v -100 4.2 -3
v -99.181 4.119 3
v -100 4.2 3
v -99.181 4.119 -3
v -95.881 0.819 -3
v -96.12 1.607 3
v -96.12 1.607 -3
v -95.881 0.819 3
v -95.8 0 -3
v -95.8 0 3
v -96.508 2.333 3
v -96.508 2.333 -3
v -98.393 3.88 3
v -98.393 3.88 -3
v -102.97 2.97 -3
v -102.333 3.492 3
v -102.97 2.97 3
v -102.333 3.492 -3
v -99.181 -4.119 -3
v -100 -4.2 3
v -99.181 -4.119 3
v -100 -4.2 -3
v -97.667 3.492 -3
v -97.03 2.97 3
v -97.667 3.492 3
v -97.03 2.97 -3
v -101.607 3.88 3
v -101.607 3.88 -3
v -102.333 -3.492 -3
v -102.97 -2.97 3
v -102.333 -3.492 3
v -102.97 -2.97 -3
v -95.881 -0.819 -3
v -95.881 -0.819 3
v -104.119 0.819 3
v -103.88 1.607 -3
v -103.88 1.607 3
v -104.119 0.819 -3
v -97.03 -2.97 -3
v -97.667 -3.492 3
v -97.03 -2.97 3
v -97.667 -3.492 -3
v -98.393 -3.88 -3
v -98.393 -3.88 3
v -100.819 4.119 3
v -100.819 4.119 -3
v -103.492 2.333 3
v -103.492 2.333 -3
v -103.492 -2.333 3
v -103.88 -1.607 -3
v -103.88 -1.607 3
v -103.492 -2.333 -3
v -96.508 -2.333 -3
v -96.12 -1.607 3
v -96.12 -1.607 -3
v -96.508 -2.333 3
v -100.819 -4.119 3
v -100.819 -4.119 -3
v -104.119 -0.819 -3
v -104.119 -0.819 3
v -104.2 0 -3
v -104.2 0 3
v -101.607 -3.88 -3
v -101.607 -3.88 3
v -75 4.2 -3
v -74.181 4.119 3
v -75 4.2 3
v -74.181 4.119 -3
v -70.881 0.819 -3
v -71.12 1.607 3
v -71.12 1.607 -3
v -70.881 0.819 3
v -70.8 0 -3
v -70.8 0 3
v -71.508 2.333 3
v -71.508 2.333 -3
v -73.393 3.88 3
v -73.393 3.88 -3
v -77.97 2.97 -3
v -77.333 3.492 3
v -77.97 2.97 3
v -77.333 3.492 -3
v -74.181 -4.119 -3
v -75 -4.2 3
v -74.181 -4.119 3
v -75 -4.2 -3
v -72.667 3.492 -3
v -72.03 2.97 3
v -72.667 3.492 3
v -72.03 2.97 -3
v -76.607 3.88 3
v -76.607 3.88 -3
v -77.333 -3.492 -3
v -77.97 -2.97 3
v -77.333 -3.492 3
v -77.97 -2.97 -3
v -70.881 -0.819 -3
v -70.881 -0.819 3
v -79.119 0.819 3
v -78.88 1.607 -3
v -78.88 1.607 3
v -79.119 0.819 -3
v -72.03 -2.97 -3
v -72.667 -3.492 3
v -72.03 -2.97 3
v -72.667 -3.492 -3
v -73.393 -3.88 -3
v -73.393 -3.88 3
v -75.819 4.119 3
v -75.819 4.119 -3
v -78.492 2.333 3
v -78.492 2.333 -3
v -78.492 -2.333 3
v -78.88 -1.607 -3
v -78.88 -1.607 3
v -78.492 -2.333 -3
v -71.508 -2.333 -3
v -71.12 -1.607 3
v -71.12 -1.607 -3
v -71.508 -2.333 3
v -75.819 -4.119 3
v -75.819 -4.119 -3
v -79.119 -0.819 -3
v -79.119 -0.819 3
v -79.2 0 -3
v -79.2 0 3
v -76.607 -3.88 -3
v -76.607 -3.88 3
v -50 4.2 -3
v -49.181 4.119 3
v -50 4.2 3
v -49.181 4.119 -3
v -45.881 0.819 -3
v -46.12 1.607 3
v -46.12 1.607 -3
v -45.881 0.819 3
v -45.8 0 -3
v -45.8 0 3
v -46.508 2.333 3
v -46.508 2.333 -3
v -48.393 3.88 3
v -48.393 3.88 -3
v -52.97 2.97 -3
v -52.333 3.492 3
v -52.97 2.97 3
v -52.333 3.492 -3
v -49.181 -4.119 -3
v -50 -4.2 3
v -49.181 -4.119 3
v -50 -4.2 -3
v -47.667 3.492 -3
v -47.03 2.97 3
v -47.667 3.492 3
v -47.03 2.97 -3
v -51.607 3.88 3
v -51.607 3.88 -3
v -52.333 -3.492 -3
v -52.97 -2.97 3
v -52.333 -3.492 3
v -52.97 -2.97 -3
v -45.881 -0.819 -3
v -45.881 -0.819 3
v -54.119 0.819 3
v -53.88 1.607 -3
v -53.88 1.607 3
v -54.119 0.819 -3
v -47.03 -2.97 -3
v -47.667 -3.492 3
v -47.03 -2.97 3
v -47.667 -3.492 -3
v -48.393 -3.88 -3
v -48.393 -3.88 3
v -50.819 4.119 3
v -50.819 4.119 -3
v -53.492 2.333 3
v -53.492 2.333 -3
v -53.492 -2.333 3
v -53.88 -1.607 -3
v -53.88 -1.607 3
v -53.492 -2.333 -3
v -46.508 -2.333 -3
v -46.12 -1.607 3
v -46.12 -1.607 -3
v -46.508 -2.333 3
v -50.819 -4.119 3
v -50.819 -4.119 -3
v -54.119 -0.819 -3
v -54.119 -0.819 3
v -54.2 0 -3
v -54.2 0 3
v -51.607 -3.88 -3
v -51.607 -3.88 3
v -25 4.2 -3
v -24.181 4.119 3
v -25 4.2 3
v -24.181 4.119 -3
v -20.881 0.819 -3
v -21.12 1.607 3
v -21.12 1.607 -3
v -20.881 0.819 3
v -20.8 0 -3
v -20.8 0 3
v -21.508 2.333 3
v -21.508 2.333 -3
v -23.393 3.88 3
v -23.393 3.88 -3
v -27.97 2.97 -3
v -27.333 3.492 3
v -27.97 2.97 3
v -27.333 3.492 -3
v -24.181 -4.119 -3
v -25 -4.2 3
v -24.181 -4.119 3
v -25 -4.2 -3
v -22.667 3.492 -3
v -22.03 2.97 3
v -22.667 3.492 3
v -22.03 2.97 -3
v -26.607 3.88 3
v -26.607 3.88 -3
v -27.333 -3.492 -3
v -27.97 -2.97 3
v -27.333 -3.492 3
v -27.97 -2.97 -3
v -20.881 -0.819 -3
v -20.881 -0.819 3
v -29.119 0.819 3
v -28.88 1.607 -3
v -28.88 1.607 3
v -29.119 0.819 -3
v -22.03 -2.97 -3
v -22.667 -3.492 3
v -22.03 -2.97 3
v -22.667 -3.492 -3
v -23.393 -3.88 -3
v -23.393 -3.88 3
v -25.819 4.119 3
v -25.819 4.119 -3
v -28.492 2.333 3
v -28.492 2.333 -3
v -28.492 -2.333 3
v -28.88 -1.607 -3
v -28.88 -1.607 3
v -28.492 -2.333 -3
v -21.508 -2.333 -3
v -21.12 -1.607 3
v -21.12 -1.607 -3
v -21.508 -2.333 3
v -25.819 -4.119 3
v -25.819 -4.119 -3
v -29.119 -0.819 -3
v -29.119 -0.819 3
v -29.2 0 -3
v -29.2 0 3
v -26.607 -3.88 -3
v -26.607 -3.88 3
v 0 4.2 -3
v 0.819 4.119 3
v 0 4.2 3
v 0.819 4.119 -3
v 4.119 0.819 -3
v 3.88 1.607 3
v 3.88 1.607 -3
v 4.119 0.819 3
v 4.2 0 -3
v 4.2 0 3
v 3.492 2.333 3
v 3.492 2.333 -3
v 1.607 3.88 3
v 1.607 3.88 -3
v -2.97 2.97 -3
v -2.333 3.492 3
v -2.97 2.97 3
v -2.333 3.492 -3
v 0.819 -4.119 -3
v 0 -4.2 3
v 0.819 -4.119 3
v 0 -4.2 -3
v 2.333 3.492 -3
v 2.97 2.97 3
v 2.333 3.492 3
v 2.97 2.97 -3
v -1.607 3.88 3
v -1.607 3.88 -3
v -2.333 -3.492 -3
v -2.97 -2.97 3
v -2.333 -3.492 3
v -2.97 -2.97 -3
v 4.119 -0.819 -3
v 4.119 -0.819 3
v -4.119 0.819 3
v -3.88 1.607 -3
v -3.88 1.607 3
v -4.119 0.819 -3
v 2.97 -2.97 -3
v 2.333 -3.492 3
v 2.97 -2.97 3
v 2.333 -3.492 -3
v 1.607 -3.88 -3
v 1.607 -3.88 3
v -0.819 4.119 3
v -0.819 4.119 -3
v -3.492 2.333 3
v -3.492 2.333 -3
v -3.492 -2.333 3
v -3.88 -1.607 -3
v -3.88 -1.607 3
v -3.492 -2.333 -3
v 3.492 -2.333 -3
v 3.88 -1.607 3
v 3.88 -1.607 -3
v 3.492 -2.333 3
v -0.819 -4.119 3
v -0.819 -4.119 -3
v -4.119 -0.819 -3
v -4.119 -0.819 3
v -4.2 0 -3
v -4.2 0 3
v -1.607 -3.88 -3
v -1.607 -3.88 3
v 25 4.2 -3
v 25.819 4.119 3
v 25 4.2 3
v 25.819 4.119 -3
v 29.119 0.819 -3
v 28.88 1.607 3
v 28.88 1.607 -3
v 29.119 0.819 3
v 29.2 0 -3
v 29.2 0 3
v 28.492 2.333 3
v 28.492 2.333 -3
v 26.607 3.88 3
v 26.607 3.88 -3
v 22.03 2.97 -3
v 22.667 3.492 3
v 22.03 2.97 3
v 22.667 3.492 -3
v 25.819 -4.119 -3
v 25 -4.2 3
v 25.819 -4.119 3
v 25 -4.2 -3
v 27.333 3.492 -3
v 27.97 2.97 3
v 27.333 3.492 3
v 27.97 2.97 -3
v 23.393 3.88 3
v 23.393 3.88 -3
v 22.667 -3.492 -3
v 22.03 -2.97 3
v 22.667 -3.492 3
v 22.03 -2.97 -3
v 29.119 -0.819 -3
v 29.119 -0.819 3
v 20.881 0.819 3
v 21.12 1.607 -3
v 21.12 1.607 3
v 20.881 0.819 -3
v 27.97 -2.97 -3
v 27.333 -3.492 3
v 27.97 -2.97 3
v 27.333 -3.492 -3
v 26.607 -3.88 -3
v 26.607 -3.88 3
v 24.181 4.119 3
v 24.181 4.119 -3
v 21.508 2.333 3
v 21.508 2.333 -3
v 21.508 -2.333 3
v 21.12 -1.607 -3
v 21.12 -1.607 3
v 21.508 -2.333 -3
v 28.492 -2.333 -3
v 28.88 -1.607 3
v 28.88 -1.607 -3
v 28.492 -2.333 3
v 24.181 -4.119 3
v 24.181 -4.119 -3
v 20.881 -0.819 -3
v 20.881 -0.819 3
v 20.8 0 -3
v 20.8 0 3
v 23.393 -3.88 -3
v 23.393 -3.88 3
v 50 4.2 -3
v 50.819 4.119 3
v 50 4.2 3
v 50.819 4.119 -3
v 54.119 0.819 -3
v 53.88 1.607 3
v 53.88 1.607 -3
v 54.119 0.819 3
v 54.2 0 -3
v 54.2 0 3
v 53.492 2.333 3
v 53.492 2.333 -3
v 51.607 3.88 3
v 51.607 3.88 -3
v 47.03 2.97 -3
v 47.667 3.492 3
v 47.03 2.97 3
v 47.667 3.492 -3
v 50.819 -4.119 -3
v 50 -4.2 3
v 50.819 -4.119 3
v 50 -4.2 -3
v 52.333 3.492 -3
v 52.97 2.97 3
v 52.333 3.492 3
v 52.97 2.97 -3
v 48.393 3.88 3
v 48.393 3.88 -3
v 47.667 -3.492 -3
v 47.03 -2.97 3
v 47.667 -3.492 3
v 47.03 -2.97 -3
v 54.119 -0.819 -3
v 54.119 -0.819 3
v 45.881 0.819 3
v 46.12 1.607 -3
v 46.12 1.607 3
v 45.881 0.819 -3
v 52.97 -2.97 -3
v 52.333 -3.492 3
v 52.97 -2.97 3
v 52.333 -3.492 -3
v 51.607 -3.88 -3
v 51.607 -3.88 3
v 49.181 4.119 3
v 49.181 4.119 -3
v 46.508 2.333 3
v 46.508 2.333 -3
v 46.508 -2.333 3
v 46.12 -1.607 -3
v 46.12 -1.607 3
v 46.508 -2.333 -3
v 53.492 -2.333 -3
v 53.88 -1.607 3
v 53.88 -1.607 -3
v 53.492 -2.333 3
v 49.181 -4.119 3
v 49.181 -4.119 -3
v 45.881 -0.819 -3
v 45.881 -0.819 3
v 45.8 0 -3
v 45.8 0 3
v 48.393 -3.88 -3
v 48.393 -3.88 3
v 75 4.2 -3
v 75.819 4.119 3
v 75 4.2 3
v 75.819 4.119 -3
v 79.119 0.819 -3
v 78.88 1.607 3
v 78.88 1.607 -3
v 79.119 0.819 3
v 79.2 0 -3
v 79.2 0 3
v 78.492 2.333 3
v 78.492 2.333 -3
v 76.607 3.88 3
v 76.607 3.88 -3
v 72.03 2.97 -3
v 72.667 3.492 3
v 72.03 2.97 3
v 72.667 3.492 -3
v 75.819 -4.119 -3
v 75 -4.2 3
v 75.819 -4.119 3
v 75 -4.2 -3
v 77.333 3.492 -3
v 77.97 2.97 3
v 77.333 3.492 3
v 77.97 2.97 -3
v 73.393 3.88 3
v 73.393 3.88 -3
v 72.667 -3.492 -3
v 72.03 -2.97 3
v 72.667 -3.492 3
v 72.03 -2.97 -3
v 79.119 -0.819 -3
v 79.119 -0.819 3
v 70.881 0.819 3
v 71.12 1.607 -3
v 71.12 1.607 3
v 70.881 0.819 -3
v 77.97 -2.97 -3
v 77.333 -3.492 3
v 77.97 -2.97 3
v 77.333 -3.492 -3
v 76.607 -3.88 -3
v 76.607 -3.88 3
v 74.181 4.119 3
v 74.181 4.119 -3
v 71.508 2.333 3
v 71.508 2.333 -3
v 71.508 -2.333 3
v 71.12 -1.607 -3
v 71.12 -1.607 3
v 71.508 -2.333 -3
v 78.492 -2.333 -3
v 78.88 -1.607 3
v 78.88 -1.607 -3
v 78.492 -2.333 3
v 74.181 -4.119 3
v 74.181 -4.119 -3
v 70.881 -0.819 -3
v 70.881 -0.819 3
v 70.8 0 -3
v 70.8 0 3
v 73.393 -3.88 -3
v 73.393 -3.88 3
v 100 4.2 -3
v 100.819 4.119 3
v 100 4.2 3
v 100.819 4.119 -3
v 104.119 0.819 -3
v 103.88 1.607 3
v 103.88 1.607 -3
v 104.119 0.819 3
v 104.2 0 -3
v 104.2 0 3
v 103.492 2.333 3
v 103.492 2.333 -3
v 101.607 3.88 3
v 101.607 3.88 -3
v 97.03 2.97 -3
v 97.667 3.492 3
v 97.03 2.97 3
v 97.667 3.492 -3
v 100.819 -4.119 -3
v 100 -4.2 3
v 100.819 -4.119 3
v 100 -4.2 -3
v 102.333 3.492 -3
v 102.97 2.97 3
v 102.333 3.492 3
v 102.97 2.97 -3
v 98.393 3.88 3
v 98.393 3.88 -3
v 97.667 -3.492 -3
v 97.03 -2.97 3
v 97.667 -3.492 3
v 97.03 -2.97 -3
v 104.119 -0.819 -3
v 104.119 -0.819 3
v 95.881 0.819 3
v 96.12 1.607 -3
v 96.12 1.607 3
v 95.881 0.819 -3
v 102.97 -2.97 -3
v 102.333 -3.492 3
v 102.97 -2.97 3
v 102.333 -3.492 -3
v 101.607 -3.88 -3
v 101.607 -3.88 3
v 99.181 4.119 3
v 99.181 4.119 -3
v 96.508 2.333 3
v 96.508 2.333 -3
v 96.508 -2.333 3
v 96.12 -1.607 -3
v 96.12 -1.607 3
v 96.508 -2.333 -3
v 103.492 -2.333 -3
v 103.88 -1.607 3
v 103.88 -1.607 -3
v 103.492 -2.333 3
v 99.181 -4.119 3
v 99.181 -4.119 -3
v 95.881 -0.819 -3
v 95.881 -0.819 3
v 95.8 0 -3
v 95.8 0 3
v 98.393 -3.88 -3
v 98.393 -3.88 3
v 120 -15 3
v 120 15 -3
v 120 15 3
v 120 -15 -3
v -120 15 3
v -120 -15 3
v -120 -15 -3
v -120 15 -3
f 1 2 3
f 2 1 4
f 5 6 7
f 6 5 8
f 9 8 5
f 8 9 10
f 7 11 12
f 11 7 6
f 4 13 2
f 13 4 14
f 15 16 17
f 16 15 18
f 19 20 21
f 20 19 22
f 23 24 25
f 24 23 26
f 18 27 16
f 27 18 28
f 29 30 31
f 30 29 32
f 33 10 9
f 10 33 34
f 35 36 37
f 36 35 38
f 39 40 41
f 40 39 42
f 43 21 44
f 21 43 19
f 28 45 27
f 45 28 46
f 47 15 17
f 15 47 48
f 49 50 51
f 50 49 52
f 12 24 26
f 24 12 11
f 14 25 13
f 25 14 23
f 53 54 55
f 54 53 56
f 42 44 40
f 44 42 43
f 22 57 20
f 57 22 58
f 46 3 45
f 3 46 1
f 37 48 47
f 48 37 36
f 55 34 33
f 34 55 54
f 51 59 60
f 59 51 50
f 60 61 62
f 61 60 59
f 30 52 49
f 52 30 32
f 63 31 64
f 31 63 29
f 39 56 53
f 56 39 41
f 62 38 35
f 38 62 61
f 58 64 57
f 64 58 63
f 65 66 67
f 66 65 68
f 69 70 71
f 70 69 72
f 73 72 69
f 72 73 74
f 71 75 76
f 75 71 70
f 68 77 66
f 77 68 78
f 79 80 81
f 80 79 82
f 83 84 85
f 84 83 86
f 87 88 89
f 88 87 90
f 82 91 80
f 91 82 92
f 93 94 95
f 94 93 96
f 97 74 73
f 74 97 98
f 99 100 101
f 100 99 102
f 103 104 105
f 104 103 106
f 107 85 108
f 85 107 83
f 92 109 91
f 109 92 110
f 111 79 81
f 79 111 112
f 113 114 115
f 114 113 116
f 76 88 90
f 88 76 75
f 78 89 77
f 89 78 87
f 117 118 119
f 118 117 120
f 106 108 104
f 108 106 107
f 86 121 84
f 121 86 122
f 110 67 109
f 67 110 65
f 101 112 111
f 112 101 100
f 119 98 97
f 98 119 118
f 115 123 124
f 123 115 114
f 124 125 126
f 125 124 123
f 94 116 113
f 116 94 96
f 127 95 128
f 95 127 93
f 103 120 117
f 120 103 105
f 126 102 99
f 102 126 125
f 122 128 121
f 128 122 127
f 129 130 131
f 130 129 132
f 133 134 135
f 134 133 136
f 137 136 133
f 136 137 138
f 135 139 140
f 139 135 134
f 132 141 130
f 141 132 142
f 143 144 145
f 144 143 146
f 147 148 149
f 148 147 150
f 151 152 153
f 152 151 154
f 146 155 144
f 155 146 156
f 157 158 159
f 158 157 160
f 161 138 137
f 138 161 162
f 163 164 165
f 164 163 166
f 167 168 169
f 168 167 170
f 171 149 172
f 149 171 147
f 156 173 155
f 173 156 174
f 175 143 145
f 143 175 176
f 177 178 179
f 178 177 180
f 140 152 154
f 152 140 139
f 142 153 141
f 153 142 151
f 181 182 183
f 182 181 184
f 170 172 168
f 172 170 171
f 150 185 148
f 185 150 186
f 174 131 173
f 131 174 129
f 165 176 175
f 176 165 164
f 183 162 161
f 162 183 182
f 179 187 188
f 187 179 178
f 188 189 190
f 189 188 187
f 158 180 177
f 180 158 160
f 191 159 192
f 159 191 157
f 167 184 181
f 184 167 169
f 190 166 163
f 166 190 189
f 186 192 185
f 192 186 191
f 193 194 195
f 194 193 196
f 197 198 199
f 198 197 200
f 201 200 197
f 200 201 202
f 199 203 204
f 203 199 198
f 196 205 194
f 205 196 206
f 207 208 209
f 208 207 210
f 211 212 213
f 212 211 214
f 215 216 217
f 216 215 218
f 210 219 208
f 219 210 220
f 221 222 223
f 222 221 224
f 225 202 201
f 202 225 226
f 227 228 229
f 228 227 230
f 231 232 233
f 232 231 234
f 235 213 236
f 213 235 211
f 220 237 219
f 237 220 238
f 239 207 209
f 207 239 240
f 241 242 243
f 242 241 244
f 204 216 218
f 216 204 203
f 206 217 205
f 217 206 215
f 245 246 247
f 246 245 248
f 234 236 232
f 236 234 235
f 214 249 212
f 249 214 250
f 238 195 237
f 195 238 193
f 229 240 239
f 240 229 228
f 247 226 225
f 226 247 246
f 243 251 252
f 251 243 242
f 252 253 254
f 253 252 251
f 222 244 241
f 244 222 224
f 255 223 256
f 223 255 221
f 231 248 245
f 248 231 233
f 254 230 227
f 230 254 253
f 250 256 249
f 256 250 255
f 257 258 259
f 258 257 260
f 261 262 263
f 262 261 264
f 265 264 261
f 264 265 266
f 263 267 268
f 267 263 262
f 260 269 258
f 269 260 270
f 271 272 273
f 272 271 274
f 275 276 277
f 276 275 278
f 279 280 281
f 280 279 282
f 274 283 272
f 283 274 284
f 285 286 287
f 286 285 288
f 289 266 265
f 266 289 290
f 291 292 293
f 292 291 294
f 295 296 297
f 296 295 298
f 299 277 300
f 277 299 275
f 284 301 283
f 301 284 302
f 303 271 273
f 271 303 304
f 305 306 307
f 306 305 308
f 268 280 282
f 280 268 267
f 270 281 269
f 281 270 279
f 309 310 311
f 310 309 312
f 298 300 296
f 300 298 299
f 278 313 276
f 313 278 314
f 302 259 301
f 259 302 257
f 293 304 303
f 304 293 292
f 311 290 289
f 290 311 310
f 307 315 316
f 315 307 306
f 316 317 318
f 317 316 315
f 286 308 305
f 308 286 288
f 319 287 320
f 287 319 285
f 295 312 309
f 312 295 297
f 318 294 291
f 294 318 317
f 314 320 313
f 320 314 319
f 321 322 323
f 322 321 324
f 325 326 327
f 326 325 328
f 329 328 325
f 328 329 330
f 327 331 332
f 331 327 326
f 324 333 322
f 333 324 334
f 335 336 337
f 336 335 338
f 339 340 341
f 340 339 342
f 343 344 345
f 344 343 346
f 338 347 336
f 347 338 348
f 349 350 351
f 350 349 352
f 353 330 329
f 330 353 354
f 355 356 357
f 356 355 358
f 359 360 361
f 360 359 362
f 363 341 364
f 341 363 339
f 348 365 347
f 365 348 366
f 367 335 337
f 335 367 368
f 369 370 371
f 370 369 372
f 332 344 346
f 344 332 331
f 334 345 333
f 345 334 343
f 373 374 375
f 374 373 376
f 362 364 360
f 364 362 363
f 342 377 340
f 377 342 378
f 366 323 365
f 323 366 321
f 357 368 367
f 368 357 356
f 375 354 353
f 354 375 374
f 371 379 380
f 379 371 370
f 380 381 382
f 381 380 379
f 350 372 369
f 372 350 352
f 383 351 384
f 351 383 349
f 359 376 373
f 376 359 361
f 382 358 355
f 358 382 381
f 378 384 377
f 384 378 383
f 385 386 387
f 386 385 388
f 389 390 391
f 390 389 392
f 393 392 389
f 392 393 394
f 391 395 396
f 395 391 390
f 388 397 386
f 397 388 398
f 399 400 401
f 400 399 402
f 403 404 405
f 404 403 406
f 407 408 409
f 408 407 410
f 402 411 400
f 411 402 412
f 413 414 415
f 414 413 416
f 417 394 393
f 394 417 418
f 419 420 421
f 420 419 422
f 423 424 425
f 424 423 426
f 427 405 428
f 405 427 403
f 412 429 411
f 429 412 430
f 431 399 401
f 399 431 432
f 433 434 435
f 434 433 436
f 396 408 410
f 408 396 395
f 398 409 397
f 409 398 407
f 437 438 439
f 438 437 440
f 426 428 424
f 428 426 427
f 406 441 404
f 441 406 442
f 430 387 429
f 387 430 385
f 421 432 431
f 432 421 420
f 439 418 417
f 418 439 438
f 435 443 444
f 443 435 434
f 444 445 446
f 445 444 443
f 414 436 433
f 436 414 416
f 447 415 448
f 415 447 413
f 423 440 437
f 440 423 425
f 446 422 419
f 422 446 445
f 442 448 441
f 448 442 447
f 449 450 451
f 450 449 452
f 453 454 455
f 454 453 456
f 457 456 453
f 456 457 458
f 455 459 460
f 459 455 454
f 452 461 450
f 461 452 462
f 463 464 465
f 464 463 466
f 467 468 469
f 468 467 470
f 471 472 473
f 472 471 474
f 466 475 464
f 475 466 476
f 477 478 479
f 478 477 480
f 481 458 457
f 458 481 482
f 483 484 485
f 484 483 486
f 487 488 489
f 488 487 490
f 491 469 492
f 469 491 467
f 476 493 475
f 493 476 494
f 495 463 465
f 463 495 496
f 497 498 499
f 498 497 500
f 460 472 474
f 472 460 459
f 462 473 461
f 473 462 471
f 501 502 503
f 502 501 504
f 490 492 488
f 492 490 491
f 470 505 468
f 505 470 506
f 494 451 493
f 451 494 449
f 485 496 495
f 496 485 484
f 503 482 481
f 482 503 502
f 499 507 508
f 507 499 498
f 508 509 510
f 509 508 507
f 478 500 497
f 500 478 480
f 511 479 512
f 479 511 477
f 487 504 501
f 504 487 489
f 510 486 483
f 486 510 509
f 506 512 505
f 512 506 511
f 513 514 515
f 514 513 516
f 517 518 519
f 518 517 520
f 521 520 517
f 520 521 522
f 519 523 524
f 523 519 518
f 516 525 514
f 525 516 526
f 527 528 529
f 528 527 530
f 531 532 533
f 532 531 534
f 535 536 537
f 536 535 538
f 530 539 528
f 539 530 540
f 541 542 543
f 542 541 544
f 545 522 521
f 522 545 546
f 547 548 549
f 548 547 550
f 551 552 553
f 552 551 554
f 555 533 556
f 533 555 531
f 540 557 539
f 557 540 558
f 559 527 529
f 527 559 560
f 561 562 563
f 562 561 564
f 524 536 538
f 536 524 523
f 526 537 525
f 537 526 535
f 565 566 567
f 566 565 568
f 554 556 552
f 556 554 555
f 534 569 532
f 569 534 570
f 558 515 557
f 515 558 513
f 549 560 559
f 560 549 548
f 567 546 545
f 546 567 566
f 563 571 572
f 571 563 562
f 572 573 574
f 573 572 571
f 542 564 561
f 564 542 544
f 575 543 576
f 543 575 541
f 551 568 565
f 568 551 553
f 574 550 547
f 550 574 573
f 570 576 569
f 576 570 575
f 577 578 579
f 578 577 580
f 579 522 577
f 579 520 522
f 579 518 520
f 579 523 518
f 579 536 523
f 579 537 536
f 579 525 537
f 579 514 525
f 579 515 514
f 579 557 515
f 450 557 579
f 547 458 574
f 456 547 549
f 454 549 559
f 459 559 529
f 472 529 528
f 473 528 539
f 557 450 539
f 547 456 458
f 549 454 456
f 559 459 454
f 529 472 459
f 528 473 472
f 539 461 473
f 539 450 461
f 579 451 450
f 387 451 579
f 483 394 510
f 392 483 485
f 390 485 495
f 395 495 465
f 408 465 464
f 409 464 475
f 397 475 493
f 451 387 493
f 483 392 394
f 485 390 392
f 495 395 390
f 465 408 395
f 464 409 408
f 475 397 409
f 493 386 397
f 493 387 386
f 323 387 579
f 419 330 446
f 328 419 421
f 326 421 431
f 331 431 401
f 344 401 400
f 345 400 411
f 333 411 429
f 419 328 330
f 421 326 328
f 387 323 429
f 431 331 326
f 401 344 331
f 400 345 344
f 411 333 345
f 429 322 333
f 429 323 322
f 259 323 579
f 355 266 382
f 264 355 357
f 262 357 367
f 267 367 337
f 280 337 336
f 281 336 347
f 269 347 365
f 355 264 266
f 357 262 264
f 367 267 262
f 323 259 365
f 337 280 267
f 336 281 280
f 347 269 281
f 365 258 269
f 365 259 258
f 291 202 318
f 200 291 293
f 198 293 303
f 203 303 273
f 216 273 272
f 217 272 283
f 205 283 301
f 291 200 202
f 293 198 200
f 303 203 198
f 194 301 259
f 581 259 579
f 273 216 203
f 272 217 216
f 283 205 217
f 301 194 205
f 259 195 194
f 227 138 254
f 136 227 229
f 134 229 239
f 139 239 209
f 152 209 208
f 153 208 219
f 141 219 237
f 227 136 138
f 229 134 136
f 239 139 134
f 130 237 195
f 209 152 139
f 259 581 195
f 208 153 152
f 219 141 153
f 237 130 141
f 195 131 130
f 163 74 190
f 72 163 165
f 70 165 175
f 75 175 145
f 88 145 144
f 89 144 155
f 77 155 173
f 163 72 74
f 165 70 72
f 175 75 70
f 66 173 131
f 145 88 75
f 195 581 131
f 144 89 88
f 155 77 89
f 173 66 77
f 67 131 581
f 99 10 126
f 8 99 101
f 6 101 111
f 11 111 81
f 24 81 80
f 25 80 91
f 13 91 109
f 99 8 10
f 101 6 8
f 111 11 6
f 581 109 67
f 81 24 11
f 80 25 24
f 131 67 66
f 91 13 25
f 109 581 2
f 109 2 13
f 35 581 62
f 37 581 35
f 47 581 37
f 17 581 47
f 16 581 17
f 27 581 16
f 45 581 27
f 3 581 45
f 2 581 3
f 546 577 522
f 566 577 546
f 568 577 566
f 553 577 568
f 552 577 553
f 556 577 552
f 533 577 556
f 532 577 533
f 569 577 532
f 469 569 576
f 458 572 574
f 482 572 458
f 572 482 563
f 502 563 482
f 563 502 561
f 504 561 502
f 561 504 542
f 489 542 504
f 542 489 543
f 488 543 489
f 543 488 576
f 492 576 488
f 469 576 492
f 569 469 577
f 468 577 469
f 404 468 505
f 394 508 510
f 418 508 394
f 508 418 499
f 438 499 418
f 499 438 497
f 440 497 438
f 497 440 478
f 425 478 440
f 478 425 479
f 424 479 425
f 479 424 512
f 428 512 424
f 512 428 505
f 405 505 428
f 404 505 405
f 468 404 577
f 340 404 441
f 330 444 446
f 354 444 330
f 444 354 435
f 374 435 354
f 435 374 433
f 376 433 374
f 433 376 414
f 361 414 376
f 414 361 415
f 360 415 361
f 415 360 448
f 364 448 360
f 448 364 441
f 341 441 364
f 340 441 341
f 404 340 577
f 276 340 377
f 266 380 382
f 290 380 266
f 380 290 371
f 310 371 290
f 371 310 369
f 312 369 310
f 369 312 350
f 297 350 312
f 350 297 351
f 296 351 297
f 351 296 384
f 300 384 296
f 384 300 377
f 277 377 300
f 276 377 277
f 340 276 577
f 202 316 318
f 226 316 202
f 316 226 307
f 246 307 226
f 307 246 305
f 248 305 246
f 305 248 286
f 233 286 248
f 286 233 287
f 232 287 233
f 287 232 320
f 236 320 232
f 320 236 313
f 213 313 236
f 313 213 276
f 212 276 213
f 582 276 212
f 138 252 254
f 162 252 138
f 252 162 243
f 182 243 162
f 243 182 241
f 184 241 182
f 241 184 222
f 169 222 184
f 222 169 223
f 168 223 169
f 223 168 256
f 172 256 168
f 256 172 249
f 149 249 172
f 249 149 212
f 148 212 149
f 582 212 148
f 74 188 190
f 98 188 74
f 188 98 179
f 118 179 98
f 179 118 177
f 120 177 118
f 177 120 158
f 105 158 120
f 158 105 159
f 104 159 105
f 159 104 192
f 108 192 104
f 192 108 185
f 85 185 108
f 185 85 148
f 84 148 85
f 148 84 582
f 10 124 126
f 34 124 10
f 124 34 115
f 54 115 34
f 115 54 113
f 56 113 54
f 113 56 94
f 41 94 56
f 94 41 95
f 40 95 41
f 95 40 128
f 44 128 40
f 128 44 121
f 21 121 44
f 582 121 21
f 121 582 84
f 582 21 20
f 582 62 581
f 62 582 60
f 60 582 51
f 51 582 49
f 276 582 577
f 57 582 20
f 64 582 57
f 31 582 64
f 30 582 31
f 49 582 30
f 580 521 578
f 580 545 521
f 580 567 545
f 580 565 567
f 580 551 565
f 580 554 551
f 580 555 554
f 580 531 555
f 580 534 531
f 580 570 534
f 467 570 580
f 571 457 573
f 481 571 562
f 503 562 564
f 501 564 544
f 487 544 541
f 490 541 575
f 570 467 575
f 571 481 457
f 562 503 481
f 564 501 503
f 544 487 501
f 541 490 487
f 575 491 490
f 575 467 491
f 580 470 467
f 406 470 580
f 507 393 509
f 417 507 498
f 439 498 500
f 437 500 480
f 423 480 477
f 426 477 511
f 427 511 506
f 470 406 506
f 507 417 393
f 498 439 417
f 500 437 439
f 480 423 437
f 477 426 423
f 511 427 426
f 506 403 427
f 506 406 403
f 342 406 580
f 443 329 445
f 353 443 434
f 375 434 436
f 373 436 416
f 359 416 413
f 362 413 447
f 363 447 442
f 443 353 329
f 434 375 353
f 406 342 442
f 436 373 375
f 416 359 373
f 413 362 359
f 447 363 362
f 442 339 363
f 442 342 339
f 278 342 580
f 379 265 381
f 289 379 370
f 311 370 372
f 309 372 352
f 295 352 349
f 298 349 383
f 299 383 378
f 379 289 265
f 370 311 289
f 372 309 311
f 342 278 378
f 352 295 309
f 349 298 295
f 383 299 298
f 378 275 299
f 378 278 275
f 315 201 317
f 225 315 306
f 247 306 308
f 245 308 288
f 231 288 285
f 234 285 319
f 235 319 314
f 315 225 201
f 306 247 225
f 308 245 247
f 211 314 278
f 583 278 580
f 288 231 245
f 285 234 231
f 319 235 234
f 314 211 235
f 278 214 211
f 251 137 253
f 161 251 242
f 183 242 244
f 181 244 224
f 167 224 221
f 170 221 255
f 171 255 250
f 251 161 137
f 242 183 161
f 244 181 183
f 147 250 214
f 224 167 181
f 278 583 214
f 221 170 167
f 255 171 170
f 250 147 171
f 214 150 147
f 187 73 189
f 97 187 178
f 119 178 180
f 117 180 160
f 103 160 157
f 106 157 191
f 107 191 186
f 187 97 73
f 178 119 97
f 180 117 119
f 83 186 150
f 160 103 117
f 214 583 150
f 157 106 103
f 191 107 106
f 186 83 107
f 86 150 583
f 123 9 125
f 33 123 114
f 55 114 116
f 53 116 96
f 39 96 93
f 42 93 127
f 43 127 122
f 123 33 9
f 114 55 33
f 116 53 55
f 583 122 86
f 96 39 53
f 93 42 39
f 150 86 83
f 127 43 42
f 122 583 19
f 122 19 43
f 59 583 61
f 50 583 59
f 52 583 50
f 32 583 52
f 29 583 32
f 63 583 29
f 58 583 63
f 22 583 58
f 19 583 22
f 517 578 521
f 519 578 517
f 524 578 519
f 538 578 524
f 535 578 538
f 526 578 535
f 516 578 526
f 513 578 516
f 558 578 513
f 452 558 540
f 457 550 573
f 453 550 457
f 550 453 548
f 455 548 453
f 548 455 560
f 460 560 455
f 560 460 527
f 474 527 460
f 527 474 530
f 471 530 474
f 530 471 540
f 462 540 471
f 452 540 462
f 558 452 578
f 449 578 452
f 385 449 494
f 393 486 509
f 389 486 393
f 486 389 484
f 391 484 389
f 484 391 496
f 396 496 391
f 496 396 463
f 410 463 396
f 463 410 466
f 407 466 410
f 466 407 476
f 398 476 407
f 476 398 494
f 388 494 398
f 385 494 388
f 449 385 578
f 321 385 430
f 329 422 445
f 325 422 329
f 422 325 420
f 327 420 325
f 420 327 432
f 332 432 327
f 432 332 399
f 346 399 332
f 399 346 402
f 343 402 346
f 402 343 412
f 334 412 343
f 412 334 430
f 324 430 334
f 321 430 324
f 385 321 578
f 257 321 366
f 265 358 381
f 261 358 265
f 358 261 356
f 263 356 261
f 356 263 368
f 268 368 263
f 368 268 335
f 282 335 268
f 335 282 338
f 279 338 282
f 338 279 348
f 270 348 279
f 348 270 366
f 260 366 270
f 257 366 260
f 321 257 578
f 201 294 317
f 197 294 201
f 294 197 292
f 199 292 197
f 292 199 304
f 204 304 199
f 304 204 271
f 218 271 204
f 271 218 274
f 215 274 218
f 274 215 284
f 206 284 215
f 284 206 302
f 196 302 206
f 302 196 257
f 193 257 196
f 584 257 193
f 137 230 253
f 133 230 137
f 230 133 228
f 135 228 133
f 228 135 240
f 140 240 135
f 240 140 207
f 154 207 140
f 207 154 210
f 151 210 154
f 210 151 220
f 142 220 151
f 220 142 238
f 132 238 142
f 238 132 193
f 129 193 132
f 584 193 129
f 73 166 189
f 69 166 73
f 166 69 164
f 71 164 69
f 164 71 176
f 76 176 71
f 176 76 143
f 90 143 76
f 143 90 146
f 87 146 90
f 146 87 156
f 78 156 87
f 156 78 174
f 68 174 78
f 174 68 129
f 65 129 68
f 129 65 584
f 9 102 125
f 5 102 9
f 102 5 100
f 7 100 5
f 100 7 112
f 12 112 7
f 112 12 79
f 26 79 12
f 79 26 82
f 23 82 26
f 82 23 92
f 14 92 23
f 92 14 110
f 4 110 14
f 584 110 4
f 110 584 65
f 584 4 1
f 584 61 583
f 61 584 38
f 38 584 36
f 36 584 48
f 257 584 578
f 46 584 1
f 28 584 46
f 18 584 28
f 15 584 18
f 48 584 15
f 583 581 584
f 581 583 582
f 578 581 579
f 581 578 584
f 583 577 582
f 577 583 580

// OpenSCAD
$fn = 32;

// ----------------------------------------------------------------------
// Hole bar, 9 x Ø8.4
// row layout, 20 mm edge offset
// ----------------------------------------------------------------------

// --- parameters (mm) ---
bar_w = 30;    // bar width (Y)
bar_t = 6;     // bar thickness (Z)
holes = 9;     // holes per row
hole_d = 8.4;  // hole diameter
edge = 20;     // offset from the bar end to the first hole
pitch = 25;    // pitch between neighbouring holes

// --- derived feature positions (mm) ---
span = (holes - 1) * pitch;   // = 200   distance between the end holes
bar_l = span + 2 * edge;      // = 240   overall bar length
start_x = -bar_l / 2 + edge;  // = -100   X of the first hole
feature_centers = [
  [start_x + 0 * pitch, 0],
  [start_x + 1 * pitch, 0],
  [start_x + 2 * pitch, 0],
  [start_x + 3 * pitch, 0],
  [start_x + 4 * pitch, 0],
  [start_x + 5 * pitch, 0],
  [start_x + 6 * pitch, 0],
  [start_x + 7 * pitch, 0],
  [start_x + 8 * pitch, 0]
];   // hole centres of the first row

// bar with one row of holes, drilled from feature_centers
difference() {
  translate([-bar_l / 2, -bar_w / 2, -bar_t / 2]) cube([bar_l, bar_w, bar_t]);
  for (centre = feature_centers)
    translate([centre[0], centre[1], 0])
      cylinder(d = hole_d, h = bar_t + 2, center = true);
}
